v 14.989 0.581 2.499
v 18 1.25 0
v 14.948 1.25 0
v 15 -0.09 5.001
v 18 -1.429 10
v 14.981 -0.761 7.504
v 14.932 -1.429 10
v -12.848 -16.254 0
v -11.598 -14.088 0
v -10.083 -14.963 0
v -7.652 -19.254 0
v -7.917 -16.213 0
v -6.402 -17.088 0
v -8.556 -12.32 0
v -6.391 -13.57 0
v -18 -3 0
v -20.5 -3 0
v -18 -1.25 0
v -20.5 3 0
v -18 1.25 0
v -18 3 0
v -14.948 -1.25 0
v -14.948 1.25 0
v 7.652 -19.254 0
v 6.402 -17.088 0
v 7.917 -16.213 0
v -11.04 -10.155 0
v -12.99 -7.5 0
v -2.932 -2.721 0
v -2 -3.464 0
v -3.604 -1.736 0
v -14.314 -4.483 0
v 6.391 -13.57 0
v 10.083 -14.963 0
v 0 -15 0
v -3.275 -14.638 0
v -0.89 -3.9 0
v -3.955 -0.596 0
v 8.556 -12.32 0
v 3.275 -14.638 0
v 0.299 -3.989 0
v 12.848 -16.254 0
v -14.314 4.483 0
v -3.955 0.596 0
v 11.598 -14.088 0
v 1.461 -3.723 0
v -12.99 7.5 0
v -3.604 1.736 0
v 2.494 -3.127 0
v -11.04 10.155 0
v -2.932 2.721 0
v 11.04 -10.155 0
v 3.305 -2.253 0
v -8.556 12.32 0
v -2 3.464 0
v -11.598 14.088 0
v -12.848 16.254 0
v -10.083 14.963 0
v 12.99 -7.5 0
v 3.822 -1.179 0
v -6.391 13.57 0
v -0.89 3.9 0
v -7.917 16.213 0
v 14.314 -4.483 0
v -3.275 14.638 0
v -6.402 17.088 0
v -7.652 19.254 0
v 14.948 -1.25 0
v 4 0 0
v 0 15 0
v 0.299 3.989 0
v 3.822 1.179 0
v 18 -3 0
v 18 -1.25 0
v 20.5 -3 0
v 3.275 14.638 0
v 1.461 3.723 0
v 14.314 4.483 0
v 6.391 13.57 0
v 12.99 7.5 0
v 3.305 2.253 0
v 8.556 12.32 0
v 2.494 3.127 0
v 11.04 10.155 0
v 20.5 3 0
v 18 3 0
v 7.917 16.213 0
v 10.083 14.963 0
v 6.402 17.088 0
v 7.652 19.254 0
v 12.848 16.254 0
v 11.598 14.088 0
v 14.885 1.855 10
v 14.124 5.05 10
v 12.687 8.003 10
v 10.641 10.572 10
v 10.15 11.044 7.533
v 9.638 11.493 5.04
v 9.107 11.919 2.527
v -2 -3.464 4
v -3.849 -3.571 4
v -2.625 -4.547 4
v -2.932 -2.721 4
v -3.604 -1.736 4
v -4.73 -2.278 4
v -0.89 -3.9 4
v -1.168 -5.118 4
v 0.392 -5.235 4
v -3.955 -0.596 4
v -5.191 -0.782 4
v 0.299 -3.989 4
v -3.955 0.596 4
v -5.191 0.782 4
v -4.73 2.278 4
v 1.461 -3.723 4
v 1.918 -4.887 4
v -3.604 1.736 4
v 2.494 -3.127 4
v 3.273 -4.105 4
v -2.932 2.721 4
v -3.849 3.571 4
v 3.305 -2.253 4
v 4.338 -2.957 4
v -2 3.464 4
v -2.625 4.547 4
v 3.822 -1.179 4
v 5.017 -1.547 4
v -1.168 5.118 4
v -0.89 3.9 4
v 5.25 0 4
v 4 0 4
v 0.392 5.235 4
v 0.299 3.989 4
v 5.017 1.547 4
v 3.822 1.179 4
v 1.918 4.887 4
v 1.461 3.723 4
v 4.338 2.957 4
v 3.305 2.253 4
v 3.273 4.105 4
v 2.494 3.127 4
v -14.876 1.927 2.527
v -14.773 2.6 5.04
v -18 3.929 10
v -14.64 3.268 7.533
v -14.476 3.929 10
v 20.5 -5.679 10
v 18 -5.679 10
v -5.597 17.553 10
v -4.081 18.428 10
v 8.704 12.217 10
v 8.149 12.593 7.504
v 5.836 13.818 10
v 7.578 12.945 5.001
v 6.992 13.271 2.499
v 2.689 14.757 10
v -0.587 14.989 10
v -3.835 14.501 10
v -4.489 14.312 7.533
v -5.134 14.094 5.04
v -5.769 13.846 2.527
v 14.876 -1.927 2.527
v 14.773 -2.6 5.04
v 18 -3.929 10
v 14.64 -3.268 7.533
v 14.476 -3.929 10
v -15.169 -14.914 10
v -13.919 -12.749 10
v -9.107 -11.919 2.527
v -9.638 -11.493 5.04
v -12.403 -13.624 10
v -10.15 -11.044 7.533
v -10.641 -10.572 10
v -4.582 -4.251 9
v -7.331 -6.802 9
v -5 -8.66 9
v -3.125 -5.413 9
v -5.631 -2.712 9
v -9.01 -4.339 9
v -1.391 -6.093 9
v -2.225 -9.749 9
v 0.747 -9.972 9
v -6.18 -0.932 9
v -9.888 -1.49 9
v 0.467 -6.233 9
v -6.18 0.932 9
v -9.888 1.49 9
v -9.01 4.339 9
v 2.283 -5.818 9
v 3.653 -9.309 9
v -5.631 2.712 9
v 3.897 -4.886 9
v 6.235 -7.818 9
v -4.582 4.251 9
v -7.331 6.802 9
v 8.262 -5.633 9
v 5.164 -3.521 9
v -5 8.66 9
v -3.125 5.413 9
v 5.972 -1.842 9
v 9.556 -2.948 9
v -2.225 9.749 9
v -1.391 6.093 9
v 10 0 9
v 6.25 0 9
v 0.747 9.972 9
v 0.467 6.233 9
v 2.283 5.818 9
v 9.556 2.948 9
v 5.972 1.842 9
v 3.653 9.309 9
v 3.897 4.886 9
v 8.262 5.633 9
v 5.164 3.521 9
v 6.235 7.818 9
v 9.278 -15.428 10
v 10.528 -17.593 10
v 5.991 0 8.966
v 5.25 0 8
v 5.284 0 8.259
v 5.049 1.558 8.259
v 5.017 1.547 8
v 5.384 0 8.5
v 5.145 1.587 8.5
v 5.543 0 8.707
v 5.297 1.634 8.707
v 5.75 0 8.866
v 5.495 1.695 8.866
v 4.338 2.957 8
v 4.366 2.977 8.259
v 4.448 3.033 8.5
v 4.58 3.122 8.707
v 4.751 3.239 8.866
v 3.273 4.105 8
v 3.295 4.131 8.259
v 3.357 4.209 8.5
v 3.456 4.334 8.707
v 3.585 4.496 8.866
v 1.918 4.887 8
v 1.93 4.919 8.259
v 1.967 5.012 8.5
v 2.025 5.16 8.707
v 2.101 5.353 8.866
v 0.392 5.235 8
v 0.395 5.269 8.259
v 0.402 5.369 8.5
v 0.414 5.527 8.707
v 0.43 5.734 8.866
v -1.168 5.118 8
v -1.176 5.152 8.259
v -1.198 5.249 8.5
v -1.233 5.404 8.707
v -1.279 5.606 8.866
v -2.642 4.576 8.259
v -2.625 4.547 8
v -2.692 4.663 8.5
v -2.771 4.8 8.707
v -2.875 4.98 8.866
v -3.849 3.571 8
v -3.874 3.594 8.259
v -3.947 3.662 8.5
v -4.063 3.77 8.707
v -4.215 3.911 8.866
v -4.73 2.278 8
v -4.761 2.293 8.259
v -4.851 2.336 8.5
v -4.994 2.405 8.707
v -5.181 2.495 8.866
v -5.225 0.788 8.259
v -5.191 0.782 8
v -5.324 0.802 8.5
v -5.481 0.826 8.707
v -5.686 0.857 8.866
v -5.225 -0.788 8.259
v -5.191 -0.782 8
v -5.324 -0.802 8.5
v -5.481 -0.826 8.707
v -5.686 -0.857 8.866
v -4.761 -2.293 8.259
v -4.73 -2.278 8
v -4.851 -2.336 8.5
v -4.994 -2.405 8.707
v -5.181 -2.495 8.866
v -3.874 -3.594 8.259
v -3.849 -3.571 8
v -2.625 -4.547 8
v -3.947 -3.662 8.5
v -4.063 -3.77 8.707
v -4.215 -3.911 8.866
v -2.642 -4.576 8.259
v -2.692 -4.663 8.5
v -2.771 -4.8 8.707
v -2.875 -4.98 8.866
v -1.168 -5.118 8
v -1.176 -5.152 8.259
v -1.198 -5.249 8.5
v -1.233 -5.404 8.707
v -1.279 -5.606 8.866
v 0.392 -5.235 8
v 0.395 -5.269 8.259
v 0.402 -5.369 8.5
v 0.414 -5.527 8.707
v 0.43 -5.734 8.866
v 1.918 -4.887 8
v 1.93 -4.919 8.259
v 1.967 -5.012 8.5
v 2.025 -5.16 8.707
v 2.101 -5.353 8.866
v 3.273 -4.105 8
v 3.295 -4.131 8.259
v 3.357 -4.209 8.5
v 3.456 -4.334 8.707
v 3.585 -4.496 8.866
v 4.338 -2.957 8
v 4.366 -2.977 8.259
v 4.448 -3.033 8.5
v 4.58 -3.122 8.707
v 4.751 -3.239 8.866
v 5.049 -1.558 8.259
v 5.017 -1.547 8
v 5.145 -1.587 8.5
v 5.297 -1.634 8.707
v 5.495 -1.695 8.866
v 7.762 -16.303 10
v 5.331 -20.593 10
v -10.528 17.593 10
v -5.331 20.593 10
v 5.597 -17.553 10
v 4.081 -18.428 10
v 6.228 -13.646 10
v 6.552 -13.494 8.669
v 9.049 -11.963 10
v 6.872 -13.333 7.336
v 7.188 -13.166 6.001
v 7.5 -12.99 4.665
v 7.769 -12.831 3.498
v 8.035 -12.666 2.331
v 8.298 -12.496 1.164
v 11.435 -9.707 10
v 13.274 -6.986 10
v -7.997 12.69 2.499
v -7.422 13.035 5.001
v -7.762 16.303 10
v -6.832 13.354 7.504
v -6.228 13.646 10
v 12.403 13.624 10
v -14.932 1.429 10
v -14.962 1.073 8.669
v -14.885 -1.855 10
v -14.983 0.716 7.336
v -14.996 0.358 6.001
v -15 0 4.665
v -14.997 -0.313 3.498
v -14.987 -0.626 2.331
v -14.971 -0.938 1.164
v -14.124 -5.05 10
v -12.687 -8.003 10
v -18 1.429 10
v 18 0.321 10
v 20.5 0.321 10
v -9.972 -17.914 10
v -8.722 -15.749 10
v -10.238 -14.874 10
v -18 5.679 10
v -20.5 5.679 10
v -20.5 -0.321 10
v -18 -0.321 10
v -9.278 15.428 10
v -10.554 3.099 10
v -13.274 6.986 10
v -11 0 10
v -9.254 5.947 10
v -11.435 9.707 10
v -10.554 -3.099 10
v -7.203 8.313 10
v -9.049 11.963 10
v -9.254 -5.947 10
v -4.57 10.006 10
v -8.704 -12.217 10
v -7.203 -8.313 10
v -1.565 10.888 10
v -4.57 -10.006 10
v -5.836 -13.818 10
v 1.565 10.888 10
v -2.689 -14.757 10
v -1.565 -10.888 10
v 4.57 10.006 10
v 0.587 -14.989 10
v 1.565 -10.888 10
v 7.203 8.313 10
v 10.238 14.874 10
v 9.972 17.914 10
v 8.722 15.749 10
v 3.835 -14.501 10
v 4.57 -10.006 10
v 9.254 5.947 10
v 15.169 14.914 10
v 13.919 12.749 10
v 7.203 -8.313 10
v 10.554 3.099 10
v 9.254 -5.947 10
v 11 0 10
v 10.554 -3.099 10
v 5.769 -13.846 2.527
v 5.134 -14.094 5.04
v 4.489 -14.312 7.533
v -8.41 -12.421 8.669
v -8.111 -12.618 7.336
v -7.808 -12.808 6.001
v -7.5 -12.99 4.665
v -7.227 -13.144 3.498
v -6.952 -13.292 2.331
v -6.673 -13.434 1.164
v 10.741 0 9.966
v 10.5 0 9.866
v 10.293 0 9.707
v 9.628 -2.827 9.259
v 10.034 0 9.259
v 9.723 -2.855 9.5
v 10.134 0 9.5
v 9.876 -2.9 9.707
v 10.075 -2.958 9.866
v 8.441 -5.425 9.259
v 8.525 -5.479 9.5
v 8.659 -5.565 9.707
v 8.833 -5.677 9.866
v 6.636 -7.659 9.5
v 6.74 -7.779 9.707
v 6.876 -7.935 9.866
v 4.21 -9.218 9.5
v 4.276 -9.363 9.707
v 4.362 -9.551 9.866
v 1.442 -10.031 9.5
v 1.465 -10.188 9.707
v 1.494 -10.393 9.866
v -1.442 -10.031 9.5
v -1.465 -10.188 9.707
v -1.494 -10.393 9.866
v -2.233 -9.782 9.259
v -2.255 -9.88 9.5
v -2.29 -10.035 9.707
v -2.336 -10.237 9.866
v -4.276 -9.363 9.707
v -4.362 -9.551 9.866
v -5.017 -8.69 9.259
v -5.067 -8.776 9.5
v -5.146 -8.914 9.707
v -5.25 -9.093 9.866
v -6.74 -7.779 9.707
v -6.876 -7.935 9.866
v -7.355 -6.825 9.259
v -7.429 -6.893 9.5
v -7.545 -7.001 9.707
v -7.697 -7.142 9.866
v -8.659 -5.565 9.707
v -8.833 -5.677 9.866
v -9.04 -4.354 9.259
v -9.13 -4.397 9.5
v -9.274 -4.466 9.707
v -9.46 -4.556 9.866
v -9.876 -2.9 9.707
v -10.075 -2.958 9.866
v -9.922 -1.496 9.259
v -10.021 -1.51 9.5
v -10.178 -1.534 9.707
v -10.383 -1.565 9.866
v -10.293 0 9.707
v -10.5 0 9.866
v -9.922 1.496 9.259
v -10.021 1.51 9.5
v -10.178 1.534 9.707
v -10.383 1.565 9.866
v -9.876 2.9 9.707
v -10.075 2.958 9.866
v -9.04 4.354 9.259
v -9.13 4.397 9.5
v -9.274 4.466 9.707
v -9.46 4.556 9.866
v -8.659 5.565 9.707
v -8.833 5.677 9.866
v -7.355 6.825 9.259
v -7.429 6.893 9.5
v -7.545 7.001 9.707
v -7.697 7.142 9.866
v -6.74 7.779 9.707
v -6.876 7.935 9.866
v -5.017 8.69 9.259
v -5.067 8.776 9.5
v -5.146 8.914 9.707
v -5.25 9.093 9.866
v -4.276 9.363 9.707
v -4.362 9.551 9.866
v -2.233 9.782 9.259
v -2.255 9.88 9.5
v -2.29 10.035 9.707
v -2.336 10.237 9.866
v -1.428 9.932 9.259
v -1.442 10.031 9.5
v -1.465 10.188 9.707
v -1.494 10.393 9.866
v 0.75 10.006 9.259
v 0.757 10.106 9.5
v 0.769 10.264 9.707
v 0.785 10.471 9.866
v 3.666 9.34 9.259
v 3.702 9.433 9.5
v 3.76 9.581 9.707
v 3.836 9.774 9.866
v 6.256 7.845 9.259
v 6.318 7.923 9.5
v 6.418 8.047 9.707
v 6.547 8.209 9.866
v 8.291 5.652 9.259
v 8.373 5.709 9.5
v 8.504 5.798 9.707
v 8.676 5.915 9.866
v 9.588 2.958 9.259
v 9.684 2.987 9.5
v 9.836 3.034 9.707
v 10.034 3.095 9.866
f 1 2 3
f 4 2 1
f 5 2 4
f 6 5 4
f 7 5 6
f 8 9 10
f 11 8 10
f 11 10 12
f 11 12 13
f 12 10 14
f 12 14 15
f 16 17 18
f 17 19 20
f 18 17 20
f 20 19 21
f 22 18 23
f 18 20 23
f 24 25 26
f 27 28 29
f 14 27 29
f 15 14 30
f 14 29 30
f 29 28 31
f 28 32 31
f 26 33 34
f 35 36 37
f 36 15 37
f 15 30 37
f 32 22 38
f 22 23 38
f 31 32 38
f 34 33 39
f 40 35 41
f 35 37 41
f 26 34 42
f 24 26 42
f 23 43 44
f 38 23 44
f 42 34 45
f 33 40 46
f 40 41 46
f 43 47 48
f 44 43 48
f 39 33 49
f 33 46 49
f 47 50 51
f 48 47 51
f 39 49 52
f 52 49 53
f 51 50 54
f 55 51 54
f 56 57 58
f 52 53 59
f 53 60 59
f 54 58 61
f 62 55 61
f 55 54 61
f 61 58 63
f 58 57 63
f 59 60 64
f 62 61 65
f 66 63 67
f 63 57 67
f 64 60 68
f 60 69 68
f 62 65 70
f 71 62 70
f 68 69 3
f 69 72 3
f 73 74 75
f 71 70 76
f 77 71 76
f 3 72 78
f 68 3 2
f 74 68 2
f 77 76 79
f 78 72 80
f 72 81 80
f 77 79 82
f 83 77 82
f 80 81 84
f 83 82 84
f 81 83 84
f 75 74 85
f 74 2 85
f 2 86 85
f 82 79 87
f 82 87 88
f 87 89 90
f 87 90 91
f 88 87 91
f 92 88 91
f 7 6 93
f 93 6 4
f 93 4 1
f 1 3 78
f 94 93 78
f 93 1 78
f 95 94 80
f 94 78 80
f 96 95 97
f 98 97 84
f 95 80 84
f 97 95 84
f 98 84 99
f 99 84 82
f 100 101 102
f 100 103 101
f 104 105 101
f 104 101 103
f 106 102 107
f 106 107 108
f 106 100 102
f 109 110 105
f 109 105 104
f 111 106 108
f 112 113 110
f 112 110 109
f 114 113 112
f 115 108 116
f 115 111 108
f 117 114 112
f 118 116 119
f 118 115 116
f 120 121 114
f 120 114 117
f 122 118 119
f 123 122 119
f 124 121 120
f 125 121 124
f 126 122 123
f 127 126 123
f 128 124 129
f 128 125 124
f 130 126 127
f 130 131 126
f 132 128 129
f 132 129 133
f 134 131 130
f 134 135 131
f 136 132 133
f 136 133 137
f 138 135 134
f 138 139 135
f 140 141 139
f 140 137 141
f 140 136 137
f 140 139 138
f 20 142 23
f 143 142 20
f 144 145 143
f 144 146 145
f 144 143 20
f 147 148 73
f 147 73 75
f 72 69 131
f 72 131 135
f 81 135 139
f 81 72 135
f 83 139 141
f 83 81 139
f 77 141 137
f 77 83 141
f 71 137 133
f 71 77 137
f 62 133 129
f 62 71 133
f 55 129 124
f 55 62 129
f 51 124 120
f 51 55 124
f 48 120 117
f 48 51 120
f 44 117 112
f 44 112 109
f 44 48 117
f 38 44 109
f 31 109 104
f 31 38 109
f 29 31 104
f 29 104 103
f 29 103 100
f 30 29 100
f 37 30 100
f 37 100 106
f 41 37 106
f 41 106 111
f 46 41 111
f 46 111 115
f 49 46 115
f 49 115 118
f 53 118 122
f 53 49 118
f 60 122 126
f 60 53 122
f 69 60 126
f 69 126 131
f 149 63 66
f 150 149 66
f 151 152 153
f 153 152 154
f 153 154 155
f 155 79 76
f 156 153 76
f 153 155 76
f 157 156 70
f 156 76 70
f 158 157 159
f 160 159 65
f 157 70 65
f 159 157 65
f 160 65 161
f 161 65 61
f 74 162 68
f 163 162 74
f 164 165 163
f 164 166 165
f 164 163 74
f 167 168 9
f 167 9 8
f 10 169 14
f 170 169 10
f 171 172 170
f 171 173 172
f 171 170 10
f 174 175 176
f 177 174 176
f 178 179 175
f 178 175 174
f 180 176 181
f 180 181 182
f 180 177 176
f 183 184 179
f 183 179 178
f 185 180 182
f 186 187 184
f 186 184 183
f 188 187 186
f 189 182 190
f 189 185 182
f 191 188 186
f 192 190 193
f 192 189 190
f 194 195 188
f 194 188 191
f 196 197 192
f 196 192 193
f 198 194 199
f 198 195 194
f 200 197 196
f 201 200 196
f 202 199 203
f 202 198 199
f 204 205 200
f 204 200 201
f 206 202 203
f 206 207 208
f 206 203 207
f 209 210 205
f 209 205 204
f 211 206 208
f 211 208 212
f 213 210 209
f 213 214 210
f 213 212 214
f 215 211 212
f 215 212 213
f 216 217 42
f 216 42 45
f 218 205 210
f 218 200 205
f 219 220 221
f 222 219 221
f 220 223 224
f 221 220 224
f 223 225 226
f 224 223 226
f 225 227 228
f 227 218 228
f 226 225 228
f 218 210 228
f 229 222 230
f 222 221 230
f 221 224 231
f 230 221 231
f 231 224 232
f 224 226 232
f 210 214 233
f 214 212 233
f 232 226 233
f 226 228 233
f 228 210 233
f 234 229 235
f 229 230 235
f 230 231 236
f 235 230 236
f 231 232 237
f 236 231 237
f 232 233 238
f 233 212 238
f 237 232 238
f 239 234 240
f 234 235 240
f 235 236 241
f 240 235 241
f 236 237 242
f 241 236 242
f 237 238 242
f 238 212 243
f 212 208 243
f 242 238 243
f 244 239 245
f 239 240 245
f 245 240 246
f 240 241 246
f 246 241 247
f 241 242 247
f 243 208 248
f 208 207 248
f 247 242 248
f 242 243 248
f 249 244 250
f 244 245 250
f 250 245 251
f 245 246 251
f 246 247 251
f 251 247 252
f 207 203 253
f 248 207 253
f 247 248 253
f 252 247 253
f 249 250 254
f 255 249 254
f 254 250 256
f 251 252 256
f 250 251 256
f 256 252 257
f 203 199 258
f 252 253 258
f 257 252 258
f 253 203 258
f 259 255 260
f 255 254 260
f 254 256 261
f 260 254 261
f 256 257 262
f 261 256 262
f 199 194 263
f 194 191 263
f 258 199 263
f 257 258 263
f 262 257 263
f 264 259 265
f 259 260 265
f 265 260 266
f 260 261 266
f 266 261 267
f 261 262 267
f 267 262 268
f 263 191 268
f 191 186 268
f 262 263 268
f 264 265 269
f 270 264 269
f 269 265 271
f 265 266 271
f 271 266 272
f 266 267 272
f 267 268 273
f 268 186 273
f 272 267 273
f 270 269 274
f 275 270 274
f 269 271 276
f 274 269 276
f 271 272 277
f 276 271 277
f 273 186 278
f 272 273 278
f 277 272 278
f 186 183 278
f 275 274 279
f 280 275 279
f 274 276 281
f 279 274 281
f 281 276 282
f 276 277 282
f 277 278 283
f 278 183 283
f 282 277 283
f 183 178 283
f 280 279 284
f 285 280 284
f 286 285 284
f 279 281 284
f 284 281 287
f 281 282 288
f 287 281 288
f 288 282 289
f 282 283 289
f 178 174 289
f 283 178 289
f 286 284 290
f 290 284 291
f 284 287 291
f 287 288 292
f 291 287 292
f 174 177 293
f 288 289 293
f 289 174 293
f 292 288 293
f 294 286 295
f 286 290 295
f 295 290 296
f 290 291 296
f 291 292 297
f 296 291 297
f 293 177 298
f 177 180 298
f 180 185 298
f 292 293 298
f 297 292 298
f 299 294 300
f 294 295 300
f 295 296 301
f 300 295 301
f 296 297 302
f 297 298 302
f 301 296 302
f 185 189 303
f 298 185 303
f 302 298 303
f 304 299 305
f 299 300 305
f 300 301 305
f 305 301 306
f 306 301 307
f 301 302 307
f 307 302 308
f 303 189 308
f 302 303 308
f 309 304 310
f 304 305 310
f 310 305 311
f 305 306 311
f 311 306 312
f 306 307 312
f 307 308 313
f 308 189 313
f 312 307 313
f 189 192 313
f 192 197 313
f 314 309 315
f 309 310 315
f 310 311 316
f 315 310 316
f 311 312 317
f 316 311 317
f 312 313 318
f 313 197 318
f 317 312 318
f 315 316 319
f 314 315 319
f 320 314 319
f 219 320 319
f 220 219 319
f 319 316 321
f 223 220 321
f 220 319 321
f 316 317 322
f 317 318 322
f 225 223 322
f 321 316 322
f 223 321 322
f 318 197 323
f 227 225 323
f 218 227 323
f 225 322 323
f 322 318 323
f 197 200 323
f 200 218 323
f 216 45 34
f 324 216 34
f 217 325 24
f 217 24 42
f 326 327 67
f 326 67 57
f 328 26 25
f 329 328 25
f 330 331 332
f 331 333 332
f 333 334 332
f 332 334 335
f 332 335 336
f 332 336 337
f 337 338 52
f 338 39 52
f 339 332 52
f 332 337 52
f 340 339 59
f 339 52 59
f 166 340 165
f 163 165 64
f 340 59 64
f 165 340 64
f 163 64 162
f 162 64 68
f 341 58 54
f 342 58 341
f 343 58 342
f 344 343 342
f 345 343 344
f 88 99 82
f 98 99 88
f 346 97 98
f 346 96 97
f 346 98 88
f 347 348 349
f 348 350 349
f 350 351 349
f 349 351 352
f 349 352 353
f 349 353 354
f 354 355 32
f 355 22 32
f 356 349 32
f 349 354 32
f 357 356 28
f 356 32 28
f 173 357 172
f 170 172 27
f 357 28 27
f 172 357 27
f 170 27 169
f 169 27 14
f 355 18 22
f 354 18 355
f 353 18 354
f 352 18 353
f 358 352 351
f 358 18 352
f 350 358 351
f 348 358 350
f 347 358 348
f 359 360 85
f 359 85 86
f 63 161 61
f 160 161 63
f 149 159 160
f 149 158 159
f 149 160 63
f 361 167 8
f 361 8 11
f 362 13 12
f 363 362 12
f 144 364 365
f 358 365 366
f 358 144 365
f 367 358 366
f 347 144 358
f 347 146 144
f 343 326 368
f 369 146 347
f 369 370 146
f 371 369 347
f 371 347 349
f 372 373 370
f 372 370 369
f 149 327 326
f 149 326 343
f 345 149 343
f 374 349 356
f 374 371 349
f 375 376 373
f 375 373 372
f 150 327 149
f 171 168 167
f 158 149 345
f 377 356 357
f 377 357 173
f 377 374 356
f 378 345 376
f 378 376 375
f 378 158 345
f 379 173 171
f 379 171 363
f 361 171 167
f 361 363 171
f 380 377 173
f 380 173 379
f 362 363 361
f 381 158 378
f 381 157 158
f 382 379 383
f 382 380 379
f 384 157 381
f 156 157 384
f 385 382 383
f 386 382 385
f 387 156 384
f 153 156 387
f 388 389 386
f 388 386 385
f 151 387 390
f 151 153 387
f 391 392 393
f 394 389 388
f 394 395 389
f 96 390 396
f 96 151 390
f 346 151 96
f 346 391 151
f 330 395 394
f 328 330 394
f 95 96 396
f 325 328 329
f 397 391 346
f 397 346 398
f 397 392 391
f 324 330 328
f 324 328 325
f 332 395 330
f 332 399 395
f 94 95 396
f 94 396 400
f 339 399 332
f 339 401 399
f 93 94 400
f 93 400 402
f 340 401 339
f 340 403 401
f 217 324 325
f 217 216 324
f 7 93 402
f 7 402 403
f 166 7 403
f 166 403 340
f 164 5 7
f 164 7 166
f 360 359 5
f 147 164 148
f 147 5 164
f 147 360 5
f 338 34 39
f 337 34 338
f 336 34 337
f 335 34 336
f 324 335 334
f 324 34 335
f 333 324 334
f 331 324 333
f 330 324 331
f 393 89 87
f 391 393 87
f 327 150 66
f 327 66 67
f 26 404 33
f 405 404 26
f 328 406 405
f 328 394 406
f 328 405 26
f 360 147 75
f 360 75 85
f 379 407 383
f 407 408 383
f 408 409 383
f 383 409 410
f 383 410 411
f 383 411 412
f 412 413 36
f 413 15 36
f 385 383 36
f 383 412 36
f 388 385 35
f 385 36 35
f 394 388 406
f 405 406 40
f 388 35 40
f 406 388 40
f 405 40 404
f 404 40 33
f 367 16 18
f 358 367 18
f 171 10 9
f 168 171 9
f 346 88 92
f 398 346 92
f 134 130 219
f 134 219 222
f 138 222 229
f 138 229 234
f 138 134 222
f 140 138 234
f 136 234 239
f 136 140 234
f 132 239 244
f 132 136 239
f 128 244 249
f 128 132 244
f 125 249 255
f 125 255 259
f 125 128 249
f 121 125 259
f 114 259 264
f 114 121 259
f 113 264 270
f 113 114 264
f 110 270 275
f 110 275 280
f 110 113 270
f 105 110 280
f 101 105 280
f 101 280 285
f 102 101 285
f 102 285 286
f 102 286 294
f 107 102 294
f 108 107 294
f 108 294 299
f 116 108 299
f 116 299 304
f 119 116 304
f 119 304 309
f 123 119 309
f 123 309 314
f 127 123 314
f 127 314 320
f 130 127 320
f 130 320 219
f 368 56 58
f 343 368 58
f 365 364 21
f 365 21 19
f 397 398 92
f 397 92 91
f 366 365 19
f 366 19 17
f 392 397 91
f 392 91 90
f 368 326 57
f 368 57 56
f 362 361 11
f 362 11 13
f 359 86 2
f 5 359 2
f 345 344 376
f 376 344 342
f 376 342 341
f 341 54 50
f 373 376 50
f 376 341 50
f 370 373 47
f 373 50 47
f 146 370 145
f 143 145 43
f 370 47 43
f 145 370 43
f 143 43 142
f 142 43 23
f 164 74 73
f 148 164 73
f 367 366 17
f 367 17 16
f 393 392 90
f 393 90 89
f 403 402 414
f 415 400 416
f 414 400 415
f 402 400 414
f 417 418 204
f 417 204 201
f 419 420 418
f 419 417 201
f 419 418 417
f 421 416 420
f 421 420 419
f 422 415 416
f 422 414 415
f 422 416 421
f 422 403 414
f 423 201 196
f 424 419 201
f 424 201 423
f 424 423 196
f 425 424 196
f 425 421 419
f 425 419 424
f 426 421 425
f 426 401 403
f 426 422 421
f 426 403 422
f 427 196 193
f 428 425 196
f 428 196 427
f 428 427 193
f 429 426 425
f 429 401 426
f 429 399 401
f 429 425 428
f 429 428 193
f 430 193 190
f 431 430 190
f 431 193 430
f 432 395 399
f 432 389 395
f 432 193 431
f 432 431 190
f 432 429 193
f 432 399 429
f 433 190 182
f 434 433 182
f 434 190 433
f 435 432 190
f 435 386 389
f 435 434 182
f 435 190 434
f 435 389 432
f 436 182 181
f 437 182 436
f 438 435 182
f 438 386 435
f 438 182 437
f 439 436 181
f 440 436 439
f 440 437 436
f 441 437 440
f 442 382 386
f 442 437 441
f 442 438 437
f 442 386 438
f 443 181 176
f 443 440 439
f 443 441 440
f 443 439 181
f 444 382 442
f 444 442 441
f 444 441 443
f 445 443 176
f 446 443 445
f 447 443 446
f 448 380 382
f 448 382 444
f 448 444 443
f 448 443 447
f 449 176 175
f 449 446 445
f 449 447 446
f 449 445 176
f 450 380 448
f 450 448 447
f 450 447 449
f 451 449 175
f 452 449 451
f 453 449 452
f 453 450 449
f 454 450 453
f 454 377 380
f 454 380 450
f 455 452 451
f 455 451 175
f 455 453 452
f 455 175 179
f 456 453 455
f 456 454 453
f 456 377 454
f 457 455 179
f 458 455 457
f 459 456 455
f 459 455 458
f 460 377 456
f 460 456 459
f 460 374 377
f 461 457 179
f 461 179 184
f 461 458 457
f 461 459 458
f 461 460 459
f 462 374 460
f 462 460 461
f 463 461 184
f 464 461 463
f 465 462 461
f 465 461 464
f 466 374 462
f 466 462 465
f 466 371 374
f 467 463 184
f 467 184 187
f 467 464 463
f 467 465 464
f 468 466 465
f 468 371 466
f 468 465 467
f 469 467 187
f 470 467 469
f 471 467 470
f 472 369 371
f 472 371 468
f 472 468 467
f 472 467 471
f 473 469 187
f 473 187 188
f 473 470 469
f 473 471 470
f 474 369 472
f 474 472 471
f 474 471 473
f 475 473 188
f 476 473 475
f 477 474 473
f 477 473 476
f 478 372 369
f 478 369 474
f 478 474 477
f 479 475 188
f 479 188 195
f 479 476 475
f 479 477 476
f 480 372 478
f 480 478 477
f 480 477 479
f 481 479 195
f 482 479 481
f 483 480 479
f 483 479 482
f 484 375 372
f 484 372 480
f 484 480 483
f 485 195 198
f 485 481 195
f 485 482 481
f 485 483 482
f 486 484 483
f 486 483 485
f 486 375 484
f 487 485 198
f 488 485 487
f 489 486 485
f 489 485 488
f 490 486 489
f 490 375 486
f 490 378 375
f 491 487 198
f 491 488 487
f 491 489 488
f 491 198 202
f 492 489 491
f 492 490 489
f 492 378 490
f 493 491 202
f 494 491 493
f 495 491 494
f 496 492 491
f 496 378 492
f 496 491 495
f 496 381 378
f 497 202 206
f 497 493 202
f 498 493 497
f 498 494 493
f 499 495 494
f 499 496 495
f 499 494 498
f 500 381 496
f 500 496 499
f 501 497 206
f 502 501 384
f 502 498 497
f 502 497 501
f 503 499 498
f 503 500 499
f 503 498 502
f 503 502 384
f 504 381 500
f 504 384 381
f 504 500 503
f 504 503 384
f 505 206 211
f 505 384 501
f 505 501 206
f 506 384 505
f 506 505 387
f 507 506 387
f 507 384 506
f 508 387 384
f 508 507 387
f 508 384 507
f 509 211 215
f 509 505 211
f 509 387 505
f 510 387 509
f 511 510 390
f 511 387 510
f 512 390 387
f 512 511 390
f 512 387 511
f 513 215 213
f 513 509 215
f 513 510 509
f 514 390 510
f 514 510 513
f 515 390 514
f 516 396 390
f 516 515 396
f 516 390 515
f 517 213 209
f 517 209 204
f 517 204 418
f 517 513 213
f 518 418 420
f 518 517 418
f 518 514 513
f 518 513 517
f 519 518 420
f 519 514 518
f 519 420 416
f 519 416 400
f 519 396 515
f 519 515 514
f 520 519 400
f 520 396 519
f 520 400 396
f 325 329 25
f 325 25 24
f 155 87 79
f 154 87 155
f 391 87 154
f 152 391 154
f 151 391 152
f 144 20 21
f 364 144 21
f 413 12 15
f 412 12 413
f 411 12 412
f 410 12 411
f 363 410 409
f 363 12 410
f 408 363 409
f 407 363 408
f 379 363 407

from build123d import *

# Parameters (mm, degrees)
F0_R      = 15
F0_R_2    = 10
F2_DEPTH  = 10
F1_W      = 6
F1_H      = 2.5
F7_COUNT  = 6
F0_R_3    = 5.25
F0_R_4    = 4
F9_DEPTH  = 4
F10_DEPTH = 9
F11_R     = 0.99999


# Not quite as in the source:
# - a fillet or chamfer is up to 0.001 mm smaller than in the source, because OpenCascade refuses the exact size


with BuildPart() as f2:
    # F0 (on Top) → F2 (new body)
    with BuildSketch(Plane.XY):
        Circle(F0_R)
        Circle(F0_R_2, mode=Mode.SUBTRACT)
    extrude(amount=F2_DEPTH)

    # F6: sweep along a path in F5
    with BuildLine(Plane.YZ.offset(-12)) as f6_path:
        Line((-1.25, 0), (1.4294919243, 10))
    # F1 (on Top) → F6 (sweep)
    with BuildSketch(Plane.XY):
        Polygon((-18, -1.25), (-18, 1.25), (-18, 3), (-20.5, 3), (-20.5, -3), (-18, -3), align=None)
        with Locations((-15, 0)):
            Rectangle(F1_W, F1_H)
    sweep(path=f6_path.line)

    # F7: F2 ×6 about axis
    f7_axis = Axis((0, 0, 0), (0, 0, 1))


with BuildPart() as f2_1:
    add(f2.part)
    for i in range(1, F7_COUNT):
        add(f2.part.rotate(f7_axis, i * 360 / F7_COUNT))



with BuildPart() as f9:
    # F0 (on Top) → F9 (new body)
    with BuildSketch(Plane.XY):
        Circle(F0_R_3)
        Circle(F0_R_4, mode=Mode.SUBTRACT)
    extrude(amount=F9_DEPTH)


with BuildPart() as f2_2:
    add(f2_1.part)

    add(f9.part)  # F10 merges F9
    # F0 (on Top) → F10 (join)
    with BuildSketch(Plane.XY):
        Circle(F0_R_2)
        Circle(F0_R_3, mode=Mode.SUBTRACT)
    extrude(amount=F10_DEPTH)

    # F11 (radius 1 in the source; OpenCascade refuses exactly that, so slightly less here)
    f11_edges = [f2_2.edges().sort_by_distance(p)[0] for p in [
        (-10, 0, 10),
        (-5.25, 0, 9),
    ]]
    fillet(f11_edges, radius=F11_R)


solid = f2_2.part
